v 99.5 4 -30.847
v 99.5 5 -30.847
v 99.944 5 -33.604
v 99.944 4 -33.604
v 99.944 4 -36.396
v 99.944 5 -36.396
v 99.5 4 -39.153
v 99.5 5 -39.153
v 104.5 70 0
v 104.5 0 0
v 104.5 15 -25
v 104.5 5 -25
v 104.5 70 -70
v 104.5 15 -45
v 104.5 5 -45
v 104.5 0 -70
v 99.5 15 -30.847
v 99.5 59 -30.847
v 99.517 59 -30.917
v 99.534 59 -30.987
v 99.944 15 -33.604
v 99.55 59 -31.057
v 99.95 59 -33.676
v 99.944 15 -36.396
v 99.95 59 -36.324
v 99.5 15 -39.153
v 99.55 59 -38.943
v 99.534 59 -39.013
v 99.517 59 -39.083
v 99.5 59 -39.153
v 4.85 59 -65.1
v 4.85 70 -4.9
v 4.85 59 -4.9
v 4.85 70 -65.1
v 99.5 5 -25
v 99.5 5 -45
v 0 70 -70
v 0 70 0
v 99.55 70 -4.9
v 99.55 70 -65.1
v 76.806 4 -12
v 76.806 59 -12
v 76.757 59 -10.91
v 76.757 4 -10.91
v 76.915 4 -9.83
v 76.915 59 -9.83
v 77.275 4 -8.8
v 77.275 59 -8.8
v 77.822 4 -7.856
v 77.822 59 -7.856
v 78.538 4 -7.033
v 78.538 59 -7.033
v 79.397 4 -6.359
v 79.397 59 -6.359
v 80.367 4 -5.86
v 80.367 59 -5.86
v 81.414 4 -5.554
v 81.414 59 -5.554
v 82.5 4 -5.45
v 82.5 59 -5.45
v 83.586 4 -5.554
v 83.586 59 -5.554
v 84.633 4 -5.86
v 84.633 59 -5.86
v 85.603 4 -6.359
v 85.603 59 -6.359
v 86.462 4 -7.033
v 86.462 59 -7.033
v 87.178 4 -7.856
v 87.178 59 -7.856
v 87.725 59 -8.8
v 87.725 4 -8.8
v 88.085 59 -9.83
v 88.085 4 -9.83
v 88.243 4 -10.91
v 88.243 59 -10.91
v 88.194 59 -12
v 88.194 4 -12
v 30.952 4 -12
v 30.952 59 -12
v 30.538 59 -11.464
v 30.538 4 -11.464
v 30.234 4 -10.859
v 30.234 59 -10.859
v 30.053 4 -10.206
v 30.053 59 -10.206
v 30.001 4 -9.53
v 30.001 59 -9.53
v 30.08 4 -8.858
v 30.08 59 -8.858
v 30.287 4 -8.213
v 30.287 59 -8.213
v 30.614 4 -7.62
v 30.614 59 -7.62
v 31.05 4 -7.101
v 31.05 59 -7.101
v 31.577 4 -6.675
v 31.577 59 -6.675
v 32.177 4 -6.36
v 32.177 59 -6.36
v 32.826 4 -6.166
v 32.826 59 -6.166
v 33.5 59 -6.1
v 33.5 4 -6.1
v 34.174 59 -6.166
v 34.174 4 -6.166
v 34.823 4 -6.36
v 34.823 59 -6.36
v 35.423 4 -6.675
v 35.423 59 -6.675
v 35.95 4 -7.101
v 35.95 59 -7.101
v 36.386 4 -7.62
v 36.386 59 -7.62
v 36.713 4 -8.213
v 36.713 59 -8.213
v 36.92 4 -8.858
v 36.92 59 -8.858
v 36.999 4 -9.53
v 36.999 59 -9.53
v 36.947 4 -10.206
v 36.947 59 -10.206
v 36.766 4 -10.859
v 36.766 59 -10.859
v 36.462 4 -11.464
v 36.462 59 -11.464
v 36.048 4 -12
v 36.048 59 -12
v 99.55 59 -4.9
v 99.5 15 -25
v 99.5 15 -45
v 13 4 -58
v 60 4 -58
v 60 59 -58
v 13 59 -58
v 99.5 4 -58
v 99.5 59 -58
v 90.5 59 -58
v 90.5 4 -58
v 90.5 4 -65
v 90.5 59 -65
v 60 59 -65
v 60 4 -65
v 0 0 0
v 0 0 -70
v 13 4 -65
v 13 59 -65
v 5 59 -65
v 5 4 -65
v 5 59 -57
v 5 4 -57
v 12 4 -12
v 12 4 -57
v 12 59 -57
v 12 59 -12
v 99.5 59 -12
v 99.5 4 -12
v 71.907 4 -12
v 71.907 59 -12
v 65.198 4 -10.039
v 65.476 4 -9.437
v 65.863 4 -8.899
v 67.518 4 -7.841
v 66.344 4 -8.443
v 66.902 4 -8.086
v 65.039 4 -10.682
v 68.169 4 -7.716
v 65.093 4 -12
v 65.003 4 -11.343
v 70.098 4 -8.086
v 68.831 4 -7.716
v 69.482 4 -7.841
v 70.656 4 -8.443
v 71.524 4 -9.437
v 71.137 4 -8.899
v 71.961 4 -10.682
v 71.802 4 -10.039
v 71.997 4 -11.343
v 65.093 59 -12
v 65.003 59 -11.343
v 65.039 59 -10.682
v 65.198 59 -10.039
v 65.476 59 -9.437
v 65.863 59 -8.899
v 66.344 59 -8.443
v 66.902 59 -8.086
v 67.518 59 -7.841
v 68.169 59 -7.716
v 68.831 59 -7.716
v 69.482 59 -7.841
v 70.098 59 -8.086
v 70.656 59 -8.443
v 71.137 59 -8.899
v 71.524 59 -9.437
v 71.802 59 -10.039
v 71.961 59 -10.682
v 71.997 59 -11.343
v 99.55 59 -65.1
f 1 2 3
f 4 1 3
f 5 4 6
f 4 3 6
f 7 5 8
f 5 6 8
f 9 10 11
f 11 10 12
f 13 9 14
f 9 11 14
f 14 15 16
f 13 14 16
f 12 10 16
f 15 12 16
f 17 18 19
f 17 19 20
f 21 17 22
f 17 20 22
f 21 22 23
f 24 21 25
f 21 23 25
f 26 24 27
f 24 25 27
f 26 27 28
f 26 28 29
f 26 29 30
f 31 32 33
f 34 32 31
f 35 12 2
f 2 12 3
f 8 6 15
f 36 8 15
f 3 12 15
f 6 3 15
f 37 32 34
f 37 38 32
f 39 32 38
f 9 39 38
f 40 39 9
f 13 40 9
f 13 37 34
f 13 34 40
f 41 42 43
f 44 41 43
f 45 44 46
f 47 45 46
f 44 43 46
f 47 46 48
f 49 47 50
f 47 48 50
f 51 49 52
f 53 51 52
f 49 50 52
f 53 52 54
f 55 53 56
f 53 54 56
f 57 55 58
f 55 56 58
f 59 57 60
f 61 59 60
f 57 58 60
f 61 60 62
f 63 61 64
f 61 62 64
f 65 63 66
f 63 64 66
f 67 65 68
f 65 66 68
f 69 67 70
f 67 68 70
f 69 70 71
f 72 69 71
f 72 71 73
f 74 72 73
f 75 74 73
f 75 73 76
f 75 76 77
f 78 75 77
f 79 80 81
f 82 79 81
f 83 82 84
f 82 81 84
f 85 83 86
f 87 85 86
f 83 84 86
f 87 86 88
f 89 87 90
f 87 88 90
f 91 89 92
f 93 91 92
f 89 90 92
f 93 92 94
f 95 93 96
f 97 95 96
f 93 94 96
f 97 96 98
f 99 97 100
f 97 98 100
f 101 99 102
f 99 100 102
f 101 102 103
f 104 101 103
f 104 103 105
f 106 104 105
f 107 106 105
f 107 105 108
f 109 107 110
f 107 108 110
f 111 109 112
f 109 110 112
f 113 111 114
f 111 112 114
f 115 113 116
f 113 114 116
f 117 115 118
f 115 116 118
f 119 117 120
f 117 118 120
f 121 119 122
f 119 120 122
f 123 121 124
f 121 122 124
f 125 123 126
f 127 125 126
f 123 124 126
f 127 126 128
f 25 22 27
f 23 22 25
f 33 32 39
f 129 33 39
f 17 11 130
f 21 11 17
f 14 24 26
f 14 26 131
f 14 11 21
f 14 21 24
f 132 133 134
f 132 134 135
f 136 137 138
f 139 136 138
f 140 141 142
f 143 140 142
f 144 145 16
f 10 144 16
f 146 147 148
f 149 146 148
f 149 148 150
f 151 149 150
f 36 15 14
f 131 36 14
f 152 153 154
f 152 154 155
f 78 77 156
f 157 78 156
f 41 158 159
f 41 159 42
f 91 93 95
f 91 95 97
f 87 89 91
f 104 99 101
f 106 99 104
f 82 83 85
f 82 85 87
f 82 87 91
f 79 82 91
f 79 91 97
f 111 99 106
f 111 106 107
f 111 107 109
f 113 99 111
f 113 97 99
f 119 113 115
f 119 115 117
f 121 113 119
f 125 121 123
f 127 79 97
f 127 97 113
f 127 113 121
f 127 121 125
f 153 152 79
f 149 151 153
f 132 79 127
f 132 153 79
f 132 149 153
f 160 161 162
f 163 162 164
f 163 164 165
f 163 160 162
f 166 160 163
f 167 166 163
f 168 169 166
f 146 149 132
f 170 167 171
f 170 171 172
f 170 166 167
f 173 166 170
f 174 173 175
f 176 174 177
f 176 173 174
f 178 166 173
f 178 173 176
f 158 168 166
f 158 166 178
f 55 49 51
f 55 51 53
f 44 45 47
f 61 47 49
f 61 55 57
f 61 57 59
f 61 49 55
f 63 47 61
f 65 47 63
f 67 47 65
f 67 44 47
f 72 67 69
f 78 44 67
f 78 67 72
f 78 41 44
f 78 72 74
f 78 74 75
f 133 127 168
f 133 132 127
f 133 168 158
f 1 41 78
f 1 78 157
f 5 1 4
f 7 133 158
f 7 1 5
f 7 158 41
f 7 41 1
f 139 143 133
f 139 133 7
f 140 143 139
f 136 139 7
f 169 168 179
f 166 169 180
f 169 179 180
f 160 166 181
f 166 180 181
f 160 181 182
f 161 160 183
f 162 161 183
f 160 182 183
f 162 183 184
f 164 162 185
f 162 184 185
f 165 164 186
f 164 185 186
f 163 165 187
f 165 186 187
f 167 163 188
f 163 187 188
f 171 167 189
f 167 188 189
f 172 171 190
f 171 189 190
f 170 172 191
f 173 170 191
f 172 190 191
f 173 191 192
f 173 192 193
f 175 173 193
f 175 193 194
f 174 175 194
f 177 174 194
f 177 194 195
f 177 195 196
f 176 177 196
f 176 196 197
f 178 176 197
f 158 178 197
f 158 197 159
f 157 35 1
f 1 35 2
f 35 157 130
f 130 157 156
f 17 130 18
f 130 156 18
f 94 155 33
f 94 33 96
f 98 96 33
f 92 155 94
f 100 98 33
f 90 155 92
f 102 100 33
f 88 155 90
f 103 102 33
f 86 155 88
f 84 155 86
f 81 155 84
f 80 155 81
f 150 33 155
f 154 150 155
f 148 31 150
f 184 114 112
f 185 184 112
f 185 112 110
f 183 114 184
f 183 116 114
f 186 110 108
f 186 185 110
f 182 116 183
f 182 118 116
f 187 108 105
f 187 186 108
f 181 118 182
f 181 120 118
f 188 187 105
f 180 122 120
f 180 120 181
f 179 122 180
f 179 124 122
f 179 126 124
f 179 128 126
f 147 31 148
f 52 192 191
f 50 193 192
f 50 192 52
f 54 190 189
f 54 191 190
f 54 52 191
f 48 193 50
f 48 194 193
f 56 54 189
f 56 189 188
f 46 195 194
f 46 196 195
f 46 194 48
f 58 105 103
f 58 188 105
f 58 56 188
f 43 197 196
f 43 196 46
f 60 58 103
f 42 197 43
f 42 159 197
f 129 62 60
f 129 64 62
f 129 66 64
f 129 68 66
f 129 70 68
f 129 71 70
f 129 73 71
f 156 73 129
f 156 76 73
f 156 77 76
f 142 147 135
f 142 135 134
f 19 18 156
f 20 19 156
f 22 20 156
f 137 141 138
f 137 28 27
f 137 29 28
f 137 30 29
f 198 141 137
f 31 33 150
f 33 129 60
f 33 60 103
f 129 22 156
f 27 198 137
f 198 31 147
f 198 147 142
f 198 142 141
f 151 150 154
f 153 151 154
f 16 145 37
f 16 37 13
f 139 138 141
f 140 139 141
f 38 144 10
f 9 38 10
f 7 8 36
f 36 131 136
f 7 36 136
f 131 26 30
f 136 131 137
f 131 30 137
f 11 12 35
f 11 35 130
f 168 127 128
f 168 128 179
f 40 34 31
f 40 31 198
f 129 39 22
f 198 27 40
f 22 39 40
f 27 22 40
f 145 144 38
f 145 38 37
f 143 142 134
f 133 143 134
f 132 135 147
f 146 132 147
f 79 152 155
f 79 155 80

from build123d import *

# Parameters (mm, degrees)
SKETCH1_W           = 104.5
SKETCH1_H           = 70
BOSS_EXTRUDE1_DEPTH = 70
SKETCH2_W           = 94.7
SKETCH2_H           = 60.2
CUT_EXTRUDE1_DEPTH  = 11
CUT_EXTRUDE3_DEPTH  = 55
SKETCH5_W           = 20
SKETCH5_H           = 10
CUT_EXTRUDE4_DEPTH  = 10


with BuildPart() as part:
    # Sketch1 → Boss-Extrude1 (new body)
    with BuildSketch(Plane(origin=(0, 0, 0), x_dir=(1, 0, 0), z_dir=(0, 1, 0))):
        with Locations((52.25, 35)):
            Rectangle(SKETCH1_W, SKETCH1_H)
    extrude(amount=BOSS_EXTRUDE1_DEPTH)

    # Sketch2 → Cut-Extrude1 (cut)
    with BuildSketch(Plane(origin=(0, 70, 0), x_dir=(1, 0, 0), z_dir=(0, 1, 0))):
        with Locations((52.2, 35)):
            Rectangle(SKETCH2_W, SKETCH2_H)
    extrude(amount=-CUT_EXTRUDE1_DEPTH, mode=Mode.SUBTRACT)

    # Sketch3 → Cut-Extrude3 (cut)
    with BuildSketch(Plane(origin=(0, 59, 0), x_dir=(1, 0, 0), z_dir=(0, 1, 0))):
        with BuildLine():
            Line((99.5, 39.153311931), (99.5, 58))
            Line((99.5, 58), (90.5, 58))
            Line((90.5, 58), (90.5, 65))
            Line((90.5, 65), (60, 65))
            Line((60, 65), (60, 58))
            Line((60, 58), (13, 58))
            Line((13, 58), (13, 65))
            Line((13, 65), (5, 65))
            Line((5, 65), (5, 57))
            Line((5, 57), (12, 57))
            Line((12, 57), (12, 12))
            Line((12, 12), (30.952452159, 12))
            ThreePointArc((30.952452159, 12), (33.5, 6.1), (36.047547841, 12))
            Line((36.047547841, 12), (65.092654993, 12))
            ThreePointArc((65.092654993, 12), (68.5, 7.7), (71.907345007, 12))
            Line((71.907345007, 12), (76.805924131, 12))
            ThreePointArc((76.805924131, 12), (82.5, 5.45), (88.194075869, 12))
            Line((88.194075869, 12), (99.5, 12))
            Line((99.5, 12), (99.5, 30.846688069))
            ThreePointArc((99.5, 30.846688069), (100, 35), (99.5, 39.153311931))
        make_face()
    extrude(amount=-CUT_EXTRUDE3_DEPTH, mode=Mode.SUBTRACT)

    # Sketch5 → Cut-Extrude4 (cut)
    with BuildSketch(Plane(origin=(104.5, 0, 0), x_dir=(0, 0, -1), z_dir=(1, 0, 0))):
        with Locations((35, 10)):
            Rectangle(SKETCH5_W, SKETCH5_H)
    extrude(amount=-CUT_EXTRUDE4_DEPTH, mode=Mode.SUBTRACT)


solid = part.part
